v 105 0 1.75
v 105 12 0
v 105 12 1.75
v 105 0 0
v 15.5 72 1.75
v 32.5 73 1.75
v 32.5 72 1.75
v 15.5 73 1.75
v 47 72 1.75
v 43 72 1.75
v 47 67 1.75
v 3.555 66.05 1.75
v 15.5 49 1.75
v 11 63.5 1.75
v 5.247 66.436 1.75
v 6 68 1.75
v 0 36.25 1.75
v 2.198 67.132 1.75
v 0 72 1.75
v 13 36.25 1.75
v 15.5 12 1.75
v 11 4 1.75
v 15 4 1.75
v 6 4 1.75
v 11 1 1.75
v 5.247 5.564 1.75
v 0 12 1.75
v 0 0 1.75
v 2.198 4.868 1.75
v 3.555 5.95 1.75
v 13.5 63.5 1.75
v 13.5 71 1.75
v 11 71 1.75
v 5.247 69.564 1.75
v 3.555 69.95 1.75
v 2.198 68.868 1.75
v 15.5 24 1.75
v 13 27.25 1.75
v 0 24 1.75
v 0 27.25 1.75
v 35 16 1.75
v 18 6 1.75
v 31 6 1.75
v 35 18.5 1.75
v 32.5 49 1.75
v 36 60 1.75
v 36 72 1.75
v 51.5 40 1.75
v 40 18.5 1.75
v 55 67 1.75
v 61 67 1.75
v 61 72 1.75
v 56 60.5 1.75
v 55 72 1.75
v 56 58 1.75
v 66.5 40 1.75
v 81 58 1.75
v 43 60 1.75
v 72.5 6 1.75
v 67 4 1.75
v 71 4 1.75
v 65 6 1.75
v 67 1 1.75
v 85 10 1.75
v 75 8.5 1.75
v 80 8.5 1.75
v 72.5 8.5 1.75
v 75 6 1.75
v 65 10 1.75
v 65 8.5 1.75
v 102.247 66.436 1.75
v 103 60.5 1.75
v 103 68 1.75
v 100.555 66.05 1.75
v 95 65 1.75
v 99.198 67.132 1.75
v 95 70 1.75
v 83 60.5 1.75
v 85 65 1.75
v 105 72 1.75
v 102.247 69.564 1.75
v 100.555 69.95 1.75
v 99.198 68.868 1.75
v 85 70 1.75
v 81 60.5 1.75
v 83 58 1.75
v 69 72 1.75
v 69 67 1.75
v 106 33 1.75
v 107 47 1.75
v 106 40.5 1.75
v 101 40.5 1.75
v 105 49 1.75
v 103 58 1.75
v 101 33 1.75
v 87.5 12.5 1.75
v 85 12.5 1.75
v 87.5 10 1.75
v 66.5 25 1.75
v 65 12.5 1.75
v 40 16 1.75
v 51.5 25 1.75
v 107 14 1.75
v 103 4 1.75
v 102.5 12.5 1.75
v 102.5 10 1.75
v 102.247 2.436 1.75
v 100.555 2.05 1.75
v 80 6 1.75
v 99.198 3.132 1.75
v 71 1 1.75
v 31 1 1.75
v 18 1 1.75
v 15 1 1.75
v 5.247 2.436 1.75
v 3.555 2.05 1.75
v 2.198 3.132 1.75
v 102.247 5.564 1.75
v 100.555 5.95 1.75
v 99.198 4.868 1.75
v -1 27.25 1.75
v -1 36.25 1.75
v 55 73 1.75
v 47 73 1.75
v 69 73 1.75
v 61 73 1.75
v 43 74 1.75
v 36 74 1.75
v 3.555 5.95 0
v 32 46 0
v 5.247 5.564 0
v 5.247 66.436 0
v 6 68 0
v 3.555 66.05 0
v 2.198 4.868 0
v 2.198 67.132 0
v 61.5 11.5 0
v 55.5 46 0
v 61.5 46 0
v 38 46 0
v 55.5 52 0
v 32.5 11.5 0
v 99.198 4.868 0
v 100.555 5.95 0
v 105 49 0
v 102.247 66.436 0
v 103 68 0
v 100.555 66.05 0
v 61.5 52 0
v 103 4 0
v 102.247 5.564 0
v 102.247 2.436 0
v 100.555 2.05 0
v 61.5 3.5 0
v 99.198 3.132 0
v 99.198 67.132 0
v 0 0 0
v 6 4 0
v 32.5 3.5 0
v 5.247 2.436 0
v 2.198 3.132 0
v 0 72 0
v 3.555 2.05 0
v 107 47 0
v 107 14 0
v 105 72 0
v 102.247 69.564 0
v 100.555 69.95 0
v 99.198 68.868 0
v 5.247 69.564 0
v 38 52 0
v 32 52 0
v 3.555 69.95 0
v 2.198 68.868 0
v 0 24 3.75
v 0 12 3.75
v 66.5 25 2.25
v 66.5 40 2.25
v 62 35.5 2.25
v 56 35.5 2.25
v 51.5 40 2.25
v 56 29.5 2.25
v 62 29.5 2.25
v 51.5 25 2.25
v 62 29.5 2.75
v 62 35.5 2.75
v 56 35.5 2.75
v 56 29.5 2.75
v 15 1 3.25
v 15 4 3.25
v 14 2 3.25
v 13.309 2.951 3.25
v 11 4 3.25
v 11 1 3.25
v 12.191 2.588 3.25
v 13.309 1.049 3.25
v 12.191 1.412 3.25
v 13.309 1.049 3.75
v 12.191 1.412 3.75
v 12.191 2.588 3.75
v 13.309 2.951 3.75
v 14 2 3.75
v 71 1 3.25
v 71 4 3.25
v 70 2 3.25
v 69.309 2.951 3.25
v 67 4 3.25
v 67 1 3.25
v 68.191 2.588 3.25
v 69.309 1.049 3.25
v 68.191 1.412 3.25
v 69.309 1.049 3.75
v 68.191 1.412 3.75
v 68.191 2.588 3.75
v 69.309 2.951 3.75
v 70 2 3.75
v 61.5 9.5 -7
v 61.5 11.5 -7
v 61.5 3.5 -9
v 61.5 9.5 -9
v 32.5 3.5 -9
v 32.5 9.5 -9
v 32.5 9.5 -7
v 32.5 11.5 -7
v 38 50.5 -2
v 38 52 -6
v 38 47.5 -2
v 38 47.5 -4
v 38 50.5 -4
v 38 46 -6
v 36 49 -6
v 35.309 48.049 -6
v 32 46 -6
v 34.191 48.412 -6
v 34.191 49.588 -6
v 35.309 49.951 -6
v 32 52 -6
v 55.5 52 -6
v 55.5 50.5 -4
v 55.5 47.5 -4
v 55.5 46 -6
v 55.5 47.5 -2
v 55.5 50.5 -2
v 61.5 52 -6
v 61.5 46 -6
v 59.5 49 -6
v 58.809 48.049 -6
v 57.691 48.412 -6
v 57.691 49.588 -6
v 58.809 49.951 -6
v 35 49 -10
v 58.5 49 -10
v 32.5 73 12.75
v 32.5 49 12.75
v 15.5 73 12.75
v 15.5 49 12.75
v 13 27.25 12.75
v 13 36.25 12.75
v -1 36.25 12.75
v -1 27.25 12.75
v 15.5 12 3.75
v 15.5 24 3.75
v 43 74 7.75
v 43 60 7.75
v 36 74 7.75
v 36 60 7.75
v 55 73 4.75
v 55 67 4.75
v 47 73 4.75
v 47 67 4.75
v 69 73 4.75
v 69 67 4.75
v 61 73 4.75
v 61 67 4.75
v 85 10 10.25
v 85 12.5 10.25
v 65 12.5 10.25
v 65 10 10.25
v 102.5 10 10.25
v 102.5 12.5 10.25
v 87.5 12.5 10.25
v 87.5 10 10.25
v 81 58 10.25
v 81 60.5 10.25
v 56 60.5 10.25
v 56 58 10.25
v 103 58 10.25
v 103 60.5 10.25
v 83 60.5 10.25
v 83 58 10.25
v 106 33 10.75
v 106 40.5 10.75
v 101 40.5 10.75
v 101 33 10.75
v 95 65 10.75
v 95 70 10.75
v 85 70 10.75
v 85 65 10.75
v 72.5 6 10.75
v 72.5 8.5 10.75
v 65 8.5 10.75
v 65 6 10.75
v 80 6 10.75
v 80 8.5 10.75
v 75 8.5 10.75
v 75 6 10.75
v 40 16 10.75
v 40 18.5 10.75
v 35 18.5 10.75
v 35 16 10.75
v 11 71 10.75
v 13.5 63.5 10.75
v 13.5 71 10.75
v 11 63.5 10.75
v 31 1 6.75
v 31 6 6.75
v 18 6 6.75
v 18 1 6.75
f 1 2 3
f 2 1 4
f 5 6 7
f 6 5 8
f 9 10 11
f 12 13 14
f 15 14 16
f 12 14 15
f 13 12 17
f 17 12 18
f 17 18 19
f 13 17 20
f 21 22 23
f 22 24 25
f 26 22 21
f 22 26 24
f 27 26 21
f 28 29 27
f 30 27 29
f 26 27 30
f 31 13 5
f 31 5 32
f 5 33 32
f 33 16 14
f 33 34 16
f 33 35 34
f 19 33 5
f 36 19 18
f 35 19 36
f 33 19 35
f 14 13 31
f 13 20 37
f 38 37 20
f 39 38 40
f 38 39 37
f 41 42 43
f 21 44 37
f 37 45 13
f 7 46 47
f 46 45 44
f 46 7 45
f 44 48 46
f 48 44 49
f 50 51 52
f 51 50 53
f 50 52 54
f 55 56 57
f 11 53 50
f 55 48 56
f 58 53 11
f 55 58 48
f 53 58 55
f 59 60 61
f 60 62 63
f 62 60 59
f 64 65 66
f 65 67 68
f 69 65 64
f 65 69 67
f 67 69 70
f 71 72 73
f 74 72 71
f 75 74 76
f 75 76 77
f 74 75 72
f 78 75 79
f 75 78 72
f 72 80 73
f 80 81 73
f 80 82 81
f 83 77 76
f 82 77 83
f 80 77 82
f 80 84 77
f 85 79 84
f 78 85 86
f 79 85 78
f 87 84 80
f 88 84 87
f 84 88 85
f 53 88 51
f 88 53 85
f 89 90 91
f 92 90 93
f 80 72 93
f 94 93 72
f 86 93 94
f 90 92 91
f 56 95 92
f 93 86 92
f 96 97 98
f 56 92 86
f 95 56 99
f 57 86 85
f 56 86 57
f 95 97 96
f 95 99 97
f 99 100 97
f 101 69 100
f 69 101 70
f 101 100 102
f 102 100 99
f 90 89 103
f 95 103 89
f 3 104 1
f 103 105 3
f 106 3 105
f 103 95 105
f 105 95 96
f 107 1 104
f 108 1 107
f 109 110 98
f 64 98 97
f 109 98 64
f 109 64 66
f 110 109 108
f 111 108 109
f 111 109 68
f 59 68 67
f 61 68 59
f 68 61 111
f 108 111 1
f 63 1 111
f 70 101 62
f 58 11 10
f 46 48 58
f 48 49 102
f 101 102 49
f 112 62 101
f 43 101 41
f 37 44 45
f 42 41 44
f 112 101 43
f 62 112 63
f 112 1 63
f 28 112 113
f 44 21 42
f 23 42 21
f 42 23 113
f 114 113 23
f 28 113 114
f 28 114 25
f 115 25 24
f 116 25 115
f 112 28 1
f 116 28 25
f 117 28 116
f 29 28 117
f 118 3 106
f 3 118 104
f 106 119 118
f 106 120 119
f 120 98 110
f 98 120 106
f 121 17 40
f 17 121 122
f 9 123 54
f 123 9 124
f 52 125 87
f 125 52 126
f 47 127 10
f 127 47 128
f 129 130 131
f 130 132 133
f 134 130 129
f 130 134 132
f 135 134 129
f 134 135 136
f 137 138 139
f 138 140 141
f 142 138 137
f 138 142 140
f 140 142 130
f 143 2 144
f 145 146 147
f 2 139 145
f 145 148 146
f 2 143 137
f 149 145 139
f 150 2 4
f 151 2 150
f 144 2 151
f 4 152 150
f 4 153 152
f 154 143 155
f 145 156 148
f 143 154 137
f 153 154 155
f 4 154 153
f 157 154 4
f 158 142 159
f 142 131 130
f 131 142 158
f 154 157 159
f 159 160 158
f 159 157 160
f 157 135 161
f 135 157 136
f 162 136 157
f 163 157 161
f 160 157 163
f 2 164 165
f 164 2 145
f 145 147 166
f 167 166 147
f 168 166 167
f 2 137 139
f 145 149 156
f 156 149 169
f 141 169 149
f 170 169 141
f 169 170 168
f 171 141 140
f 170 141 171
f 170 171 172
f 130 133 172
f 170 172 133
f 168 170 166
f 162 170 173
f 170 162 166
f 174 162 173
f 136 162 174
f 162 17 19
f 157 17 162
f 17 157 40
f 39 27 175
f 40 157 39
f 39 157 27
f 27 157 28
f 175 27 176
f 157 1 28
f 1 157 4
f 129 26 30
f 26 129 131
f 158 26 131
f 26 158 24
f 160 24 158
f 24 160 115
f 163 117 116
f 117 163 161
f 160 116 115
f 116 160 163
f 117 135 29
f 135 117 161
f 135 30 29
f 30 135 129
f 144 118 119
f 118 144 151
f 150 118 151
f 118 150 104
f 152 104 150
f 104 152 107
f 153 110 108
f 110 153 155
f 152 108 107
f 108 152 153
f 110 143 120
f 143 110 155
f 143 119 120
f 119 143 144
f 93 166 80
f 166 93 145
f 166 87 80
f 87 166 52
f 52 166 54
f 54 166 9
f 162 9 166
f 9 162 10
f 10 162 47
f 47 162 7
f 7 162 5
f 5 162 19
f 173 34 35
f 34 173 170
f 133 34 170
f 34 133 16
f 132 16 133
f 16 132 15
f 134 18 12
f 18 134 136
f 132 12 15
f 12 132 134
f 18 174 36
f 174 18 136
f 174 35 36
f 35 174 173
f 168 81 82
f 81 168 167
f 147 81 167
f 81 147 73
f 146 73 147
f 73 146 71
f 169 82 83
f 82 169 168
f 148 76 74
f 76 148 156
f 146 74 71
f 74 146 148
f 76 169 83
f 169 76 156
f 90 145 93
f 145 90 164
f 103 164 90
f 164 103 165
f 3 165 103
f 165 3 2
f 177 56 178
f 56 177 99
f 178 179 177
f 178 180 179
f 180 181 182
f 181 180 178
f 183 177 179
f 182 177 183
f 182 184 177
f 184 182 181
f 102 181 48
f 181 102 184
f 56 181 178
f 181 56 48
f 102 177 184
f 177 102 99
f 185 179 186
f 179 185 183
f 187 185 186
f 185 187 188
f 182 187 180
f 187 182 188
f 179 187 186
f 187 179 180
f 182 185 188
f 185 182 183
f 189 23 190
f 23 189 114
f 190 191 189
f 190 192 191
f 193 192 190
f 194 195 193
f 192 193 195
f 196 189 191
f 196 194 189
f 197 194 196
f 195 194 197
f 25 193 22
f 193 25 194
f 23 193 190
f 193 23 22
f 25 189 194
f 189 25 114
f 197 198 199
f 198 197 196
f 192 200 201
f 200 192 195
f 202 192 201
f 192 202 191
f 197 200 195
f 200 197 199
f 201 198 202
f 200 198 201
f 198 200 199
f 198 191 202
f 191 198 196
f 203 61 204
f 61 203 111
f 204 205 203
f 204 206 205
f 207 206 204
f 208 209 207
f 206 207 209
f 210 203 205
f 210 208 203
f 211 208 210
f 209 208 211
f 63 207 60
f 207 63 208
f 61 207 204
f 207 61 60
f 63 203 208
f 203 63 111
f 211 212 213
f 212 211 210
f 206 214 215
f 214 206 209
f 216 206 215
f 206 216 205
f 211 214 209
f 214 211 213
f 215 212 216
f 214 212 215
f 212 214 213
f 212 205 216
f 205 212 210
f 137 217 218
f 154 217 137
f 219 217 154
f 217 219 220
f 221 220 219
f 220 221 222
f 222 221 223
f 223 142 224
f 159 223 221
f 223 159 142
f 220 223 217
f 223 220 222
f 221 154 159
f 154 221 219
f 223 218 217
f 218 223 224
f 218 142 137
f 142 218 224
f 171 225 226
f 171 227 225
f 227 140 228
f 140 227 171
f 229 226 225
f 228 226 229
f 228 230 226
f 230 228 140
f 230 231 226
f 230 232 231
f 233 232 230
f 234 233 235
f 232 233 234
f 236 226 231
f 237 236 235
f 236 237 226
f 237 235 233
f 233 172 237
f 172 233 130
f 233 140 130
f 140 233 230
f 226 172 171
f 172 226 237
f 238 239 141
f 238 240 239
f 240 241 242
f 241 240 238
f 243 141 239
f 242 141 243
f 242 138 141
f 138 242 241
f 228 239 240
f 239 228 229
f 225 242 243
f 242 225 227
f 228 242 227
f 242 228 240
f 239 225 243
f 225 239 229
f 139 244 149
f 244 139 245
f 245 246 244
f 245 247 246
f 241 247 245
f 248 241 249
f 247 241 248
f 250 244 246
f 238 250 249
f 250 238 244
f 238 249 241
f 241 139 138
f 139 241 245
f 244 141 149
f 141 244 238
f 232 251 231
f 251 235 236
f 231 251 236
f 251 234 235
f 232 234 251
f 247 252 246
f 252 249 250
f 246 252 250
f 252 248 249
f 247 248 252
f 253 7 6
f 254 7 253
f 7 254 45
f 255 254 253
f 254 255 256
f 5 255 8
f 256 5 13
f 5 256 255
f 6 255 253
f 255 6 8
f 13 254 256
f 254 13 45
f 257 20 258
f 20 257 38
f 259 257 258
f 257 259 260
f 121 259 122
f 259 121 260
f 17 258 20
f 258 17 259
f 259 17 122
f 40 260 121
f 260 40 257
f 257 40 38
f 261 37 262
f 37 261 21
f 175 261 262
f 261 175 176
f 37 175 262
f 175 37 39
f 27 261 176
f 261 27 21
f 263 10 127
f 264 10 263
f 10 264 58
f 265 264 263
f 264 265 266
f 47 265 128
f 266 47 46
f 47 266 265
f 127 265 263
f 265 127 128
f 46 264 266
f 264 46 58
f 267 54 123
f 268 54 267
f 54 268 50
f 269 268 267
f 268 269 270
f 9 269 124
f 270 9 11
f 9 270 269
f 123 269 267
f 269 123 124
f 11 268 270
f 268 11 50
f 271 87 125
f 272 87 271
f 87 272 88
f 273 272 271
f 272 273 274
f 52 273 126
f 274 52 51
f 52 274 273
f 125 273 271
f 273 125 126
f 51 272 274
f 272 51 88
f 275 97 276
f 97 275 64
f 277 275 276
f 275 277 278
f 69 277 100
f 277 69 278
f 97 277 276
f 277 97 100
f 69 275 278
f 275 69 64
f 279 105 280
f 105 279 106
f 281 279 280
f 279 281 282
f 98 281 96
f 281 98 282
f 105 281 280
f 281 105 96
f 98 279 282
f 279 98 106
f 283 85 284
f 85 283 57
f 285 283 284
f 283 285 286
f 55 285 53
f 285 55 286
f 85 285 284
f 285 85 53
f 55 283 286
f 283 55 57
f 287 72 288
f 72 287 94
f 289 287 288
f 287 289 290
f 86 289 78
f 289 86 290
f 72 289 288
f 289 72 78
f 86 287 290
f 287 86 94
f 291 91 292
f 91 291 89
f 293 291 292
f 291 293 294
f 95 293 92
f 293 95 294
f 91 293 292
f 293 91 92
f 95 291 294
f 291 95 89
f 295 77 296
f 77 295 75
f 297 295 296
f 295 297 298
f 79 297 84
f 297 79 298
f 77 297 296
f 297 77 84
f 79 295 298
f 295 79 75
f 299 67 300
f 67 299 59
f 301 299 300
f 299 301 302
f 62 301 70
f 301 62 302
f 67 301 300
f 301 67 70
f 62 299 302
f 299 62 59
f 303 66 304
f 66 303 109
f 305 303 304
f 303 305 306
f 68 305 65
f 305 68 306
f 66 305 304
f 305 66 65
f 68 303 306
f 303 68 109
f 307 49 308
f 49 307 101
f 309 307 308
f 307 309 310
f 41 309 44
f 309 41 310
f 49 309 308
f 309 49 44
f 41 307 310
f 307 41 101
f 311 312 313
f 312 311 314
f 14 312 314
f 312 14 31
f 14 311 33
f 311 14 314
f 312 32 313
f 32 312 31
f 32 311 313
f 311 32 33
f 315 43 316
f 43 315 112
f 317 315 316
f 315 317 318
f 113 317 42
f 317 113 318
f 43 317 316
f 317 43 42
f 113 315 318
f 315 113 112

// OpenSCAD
// Intel Galileo v1 3D model
// Pierre Cauchois - 8/30/2014
// http://pierreca.github.io
// http://github.com/pierreca/galileo

pcb_height = 1.75; // z-axis

module board(x, y, z) {
	color("teal") translate([x, y, z]) {
		difference() {
			cube(size=[105, 12, pcb_height]);
			translate([4, 4, -0.10])cylinder(h = 2, r = 2);
			translate([101, 4, -0.10])cylinder(h = 2, r = 2);
		}
		difference() {
			translate([0, 49, 0]) cube(size=[105, 23, pcb_height]);
			translate([4, 68, -0.10])cylinder(h = 2, r = 2);
			translate([101, 68, -0.10])cylinder(h = 2, r = 2);
		}
		hull() {
			translate([0, 12, 0]) cube(size=[105, 37, pcb_height]);
			translate([105, 14, 0]) cube(size=[2, 33, pcb_height]);
		}
	}
}

module ethernet_connector(x, y, z) {
	color("silver") translate([x, y, z]) {
		cube(size=[17, 24, 11]);
	}
}

module power_connector(x, y, z) {
	color("black") translate([x, y, z]) {
		cube(size=[14, 9, 11]);
	}
}

module sdcard(x, y, z) {
	color("silver") translate([x, y, z]) {
		cube(size=[15.5, 12, 2]);
	}
}

module audio_connector(x, y, z) {
	color("black") translate([x, y, z]) {
		cube(size=[7, 14, 6]);
	}
}
module usb_connector(x, y, z) {
	color("silver") translate([x, y, z]) {
		cube(size=[8, 6, 3]);
	}
}

module female_header(x, y, z, length) {
	color("black") translate([x, y, z]) {
		cube(size=[length, 2.5, 8.5]);
	}
}

module icsp_connector(x, y, z) {
	color("black") translate([x, y, z]) {
		cube(size=[5, 7.5, 9]);
	}
}

module white_connector(x, y, z) {
	color("white") translate([x, y, z]) {
		cube(size=[10, 5, 9]);
	}
}

module jumper_3pins(x, y, z) {
	color("black") translate([x, y, z]) {
		cube(size=[7.5, 2.5, 9]);
	}
}

module jumper_2pins(x, y, z) {
	color("black") translate([x, y, z]) {
		cube(size=[5, 2.5, 9]);
	}
}

module jtag_connector(x, y, z) {
	color("black") translate([x, y, z]) {
		cube(size=[13, 5, 5]);
	}
}

module quark(x, y, z) {
	translate([x, y, z]) {
		color("darkgreen") cube(size=[15, 15, 0.5]);
		color("dimgrey") translate([4.5, 4.5, 0.5]) cube(size=[6, 6, 0.5]);
	}
}

module bottom_connector1(x, y, z) {
	color("black") translate([x, y, z]) {
		cube(size=[29, 6, 9]);
		translate([0, 0, 2]) cube(size=[29, 8, 7]);
	}
}

module bottom_connector2(x, y, z) {
	color("black") translate([x, y, z]) {
		cube(size=[6, 6, 6]);
		translate([6, 1.5, 2]) cube(size=[17.5, 3, 2]);
		translate([23.5, 0, 0]) cube(size=[6, 6, 6]);
		translate([3, 3, 6]) cylinder(h = 4, r1 = 1, r2 = 0);
		translate([26.5, 3, 6]) cylinder(h = 4, r1 = 1, r2 = 0);
	}
}

module tactile_button(x, y, z) {
	translate([x, y, z]) {
		color("silver") cube(size=[4, 3, 1.5]);
		color("white") translate([2, 1, 1.5]) cylinder(h = 0.5, r = 1);
	}
}

module galileo_v1(x, y, z) {
	translate([x, y, z]) {
		board(0,0,0);
		ethernet_connector(15.5, 49, pcb_height);
		power_connector(-1, 27.25, pcb_height);
		sdcard(0, 12, pcb_height);
		audio_connector(36, 60, pcb_height);
		usb_connector(47, 67, pcb_height);
		usb_connector(61, 67, pcb_height);
		female_header(65, 10, pcb_height, 20);
		female_header(87.5, 10, pcb_height, 15);
		female_header(56, 58, pcb_height, 25);
		female_header(83, 58, pcb_height, 20);
		icsp_connector(101, 33, pcb_height);
		white_connector(85, 65, pcb_height);
		jumper_3pins(65, 6, pcb_height);
		jumper_2pins(75, 6, pcb_height);
		jumper_2pins(35, 16, pcb_height);
		rotate([0, 0, 90]) jumper_3pins(63.5, -13.5, pcb_height);
		jtag_connector(18, 1, pcb_height);
		quark(51.5, 25, pcb_height);
		tactile_button(11, 1, pcb_height);
		tactile_button(67, 1, pcb_height);
		bottom_connector1(32.5, 3.5, -9);
		rotate([180, 0, 0]) bottom_connector2(32, -52, 0);
	}
}

galileo_v1();
